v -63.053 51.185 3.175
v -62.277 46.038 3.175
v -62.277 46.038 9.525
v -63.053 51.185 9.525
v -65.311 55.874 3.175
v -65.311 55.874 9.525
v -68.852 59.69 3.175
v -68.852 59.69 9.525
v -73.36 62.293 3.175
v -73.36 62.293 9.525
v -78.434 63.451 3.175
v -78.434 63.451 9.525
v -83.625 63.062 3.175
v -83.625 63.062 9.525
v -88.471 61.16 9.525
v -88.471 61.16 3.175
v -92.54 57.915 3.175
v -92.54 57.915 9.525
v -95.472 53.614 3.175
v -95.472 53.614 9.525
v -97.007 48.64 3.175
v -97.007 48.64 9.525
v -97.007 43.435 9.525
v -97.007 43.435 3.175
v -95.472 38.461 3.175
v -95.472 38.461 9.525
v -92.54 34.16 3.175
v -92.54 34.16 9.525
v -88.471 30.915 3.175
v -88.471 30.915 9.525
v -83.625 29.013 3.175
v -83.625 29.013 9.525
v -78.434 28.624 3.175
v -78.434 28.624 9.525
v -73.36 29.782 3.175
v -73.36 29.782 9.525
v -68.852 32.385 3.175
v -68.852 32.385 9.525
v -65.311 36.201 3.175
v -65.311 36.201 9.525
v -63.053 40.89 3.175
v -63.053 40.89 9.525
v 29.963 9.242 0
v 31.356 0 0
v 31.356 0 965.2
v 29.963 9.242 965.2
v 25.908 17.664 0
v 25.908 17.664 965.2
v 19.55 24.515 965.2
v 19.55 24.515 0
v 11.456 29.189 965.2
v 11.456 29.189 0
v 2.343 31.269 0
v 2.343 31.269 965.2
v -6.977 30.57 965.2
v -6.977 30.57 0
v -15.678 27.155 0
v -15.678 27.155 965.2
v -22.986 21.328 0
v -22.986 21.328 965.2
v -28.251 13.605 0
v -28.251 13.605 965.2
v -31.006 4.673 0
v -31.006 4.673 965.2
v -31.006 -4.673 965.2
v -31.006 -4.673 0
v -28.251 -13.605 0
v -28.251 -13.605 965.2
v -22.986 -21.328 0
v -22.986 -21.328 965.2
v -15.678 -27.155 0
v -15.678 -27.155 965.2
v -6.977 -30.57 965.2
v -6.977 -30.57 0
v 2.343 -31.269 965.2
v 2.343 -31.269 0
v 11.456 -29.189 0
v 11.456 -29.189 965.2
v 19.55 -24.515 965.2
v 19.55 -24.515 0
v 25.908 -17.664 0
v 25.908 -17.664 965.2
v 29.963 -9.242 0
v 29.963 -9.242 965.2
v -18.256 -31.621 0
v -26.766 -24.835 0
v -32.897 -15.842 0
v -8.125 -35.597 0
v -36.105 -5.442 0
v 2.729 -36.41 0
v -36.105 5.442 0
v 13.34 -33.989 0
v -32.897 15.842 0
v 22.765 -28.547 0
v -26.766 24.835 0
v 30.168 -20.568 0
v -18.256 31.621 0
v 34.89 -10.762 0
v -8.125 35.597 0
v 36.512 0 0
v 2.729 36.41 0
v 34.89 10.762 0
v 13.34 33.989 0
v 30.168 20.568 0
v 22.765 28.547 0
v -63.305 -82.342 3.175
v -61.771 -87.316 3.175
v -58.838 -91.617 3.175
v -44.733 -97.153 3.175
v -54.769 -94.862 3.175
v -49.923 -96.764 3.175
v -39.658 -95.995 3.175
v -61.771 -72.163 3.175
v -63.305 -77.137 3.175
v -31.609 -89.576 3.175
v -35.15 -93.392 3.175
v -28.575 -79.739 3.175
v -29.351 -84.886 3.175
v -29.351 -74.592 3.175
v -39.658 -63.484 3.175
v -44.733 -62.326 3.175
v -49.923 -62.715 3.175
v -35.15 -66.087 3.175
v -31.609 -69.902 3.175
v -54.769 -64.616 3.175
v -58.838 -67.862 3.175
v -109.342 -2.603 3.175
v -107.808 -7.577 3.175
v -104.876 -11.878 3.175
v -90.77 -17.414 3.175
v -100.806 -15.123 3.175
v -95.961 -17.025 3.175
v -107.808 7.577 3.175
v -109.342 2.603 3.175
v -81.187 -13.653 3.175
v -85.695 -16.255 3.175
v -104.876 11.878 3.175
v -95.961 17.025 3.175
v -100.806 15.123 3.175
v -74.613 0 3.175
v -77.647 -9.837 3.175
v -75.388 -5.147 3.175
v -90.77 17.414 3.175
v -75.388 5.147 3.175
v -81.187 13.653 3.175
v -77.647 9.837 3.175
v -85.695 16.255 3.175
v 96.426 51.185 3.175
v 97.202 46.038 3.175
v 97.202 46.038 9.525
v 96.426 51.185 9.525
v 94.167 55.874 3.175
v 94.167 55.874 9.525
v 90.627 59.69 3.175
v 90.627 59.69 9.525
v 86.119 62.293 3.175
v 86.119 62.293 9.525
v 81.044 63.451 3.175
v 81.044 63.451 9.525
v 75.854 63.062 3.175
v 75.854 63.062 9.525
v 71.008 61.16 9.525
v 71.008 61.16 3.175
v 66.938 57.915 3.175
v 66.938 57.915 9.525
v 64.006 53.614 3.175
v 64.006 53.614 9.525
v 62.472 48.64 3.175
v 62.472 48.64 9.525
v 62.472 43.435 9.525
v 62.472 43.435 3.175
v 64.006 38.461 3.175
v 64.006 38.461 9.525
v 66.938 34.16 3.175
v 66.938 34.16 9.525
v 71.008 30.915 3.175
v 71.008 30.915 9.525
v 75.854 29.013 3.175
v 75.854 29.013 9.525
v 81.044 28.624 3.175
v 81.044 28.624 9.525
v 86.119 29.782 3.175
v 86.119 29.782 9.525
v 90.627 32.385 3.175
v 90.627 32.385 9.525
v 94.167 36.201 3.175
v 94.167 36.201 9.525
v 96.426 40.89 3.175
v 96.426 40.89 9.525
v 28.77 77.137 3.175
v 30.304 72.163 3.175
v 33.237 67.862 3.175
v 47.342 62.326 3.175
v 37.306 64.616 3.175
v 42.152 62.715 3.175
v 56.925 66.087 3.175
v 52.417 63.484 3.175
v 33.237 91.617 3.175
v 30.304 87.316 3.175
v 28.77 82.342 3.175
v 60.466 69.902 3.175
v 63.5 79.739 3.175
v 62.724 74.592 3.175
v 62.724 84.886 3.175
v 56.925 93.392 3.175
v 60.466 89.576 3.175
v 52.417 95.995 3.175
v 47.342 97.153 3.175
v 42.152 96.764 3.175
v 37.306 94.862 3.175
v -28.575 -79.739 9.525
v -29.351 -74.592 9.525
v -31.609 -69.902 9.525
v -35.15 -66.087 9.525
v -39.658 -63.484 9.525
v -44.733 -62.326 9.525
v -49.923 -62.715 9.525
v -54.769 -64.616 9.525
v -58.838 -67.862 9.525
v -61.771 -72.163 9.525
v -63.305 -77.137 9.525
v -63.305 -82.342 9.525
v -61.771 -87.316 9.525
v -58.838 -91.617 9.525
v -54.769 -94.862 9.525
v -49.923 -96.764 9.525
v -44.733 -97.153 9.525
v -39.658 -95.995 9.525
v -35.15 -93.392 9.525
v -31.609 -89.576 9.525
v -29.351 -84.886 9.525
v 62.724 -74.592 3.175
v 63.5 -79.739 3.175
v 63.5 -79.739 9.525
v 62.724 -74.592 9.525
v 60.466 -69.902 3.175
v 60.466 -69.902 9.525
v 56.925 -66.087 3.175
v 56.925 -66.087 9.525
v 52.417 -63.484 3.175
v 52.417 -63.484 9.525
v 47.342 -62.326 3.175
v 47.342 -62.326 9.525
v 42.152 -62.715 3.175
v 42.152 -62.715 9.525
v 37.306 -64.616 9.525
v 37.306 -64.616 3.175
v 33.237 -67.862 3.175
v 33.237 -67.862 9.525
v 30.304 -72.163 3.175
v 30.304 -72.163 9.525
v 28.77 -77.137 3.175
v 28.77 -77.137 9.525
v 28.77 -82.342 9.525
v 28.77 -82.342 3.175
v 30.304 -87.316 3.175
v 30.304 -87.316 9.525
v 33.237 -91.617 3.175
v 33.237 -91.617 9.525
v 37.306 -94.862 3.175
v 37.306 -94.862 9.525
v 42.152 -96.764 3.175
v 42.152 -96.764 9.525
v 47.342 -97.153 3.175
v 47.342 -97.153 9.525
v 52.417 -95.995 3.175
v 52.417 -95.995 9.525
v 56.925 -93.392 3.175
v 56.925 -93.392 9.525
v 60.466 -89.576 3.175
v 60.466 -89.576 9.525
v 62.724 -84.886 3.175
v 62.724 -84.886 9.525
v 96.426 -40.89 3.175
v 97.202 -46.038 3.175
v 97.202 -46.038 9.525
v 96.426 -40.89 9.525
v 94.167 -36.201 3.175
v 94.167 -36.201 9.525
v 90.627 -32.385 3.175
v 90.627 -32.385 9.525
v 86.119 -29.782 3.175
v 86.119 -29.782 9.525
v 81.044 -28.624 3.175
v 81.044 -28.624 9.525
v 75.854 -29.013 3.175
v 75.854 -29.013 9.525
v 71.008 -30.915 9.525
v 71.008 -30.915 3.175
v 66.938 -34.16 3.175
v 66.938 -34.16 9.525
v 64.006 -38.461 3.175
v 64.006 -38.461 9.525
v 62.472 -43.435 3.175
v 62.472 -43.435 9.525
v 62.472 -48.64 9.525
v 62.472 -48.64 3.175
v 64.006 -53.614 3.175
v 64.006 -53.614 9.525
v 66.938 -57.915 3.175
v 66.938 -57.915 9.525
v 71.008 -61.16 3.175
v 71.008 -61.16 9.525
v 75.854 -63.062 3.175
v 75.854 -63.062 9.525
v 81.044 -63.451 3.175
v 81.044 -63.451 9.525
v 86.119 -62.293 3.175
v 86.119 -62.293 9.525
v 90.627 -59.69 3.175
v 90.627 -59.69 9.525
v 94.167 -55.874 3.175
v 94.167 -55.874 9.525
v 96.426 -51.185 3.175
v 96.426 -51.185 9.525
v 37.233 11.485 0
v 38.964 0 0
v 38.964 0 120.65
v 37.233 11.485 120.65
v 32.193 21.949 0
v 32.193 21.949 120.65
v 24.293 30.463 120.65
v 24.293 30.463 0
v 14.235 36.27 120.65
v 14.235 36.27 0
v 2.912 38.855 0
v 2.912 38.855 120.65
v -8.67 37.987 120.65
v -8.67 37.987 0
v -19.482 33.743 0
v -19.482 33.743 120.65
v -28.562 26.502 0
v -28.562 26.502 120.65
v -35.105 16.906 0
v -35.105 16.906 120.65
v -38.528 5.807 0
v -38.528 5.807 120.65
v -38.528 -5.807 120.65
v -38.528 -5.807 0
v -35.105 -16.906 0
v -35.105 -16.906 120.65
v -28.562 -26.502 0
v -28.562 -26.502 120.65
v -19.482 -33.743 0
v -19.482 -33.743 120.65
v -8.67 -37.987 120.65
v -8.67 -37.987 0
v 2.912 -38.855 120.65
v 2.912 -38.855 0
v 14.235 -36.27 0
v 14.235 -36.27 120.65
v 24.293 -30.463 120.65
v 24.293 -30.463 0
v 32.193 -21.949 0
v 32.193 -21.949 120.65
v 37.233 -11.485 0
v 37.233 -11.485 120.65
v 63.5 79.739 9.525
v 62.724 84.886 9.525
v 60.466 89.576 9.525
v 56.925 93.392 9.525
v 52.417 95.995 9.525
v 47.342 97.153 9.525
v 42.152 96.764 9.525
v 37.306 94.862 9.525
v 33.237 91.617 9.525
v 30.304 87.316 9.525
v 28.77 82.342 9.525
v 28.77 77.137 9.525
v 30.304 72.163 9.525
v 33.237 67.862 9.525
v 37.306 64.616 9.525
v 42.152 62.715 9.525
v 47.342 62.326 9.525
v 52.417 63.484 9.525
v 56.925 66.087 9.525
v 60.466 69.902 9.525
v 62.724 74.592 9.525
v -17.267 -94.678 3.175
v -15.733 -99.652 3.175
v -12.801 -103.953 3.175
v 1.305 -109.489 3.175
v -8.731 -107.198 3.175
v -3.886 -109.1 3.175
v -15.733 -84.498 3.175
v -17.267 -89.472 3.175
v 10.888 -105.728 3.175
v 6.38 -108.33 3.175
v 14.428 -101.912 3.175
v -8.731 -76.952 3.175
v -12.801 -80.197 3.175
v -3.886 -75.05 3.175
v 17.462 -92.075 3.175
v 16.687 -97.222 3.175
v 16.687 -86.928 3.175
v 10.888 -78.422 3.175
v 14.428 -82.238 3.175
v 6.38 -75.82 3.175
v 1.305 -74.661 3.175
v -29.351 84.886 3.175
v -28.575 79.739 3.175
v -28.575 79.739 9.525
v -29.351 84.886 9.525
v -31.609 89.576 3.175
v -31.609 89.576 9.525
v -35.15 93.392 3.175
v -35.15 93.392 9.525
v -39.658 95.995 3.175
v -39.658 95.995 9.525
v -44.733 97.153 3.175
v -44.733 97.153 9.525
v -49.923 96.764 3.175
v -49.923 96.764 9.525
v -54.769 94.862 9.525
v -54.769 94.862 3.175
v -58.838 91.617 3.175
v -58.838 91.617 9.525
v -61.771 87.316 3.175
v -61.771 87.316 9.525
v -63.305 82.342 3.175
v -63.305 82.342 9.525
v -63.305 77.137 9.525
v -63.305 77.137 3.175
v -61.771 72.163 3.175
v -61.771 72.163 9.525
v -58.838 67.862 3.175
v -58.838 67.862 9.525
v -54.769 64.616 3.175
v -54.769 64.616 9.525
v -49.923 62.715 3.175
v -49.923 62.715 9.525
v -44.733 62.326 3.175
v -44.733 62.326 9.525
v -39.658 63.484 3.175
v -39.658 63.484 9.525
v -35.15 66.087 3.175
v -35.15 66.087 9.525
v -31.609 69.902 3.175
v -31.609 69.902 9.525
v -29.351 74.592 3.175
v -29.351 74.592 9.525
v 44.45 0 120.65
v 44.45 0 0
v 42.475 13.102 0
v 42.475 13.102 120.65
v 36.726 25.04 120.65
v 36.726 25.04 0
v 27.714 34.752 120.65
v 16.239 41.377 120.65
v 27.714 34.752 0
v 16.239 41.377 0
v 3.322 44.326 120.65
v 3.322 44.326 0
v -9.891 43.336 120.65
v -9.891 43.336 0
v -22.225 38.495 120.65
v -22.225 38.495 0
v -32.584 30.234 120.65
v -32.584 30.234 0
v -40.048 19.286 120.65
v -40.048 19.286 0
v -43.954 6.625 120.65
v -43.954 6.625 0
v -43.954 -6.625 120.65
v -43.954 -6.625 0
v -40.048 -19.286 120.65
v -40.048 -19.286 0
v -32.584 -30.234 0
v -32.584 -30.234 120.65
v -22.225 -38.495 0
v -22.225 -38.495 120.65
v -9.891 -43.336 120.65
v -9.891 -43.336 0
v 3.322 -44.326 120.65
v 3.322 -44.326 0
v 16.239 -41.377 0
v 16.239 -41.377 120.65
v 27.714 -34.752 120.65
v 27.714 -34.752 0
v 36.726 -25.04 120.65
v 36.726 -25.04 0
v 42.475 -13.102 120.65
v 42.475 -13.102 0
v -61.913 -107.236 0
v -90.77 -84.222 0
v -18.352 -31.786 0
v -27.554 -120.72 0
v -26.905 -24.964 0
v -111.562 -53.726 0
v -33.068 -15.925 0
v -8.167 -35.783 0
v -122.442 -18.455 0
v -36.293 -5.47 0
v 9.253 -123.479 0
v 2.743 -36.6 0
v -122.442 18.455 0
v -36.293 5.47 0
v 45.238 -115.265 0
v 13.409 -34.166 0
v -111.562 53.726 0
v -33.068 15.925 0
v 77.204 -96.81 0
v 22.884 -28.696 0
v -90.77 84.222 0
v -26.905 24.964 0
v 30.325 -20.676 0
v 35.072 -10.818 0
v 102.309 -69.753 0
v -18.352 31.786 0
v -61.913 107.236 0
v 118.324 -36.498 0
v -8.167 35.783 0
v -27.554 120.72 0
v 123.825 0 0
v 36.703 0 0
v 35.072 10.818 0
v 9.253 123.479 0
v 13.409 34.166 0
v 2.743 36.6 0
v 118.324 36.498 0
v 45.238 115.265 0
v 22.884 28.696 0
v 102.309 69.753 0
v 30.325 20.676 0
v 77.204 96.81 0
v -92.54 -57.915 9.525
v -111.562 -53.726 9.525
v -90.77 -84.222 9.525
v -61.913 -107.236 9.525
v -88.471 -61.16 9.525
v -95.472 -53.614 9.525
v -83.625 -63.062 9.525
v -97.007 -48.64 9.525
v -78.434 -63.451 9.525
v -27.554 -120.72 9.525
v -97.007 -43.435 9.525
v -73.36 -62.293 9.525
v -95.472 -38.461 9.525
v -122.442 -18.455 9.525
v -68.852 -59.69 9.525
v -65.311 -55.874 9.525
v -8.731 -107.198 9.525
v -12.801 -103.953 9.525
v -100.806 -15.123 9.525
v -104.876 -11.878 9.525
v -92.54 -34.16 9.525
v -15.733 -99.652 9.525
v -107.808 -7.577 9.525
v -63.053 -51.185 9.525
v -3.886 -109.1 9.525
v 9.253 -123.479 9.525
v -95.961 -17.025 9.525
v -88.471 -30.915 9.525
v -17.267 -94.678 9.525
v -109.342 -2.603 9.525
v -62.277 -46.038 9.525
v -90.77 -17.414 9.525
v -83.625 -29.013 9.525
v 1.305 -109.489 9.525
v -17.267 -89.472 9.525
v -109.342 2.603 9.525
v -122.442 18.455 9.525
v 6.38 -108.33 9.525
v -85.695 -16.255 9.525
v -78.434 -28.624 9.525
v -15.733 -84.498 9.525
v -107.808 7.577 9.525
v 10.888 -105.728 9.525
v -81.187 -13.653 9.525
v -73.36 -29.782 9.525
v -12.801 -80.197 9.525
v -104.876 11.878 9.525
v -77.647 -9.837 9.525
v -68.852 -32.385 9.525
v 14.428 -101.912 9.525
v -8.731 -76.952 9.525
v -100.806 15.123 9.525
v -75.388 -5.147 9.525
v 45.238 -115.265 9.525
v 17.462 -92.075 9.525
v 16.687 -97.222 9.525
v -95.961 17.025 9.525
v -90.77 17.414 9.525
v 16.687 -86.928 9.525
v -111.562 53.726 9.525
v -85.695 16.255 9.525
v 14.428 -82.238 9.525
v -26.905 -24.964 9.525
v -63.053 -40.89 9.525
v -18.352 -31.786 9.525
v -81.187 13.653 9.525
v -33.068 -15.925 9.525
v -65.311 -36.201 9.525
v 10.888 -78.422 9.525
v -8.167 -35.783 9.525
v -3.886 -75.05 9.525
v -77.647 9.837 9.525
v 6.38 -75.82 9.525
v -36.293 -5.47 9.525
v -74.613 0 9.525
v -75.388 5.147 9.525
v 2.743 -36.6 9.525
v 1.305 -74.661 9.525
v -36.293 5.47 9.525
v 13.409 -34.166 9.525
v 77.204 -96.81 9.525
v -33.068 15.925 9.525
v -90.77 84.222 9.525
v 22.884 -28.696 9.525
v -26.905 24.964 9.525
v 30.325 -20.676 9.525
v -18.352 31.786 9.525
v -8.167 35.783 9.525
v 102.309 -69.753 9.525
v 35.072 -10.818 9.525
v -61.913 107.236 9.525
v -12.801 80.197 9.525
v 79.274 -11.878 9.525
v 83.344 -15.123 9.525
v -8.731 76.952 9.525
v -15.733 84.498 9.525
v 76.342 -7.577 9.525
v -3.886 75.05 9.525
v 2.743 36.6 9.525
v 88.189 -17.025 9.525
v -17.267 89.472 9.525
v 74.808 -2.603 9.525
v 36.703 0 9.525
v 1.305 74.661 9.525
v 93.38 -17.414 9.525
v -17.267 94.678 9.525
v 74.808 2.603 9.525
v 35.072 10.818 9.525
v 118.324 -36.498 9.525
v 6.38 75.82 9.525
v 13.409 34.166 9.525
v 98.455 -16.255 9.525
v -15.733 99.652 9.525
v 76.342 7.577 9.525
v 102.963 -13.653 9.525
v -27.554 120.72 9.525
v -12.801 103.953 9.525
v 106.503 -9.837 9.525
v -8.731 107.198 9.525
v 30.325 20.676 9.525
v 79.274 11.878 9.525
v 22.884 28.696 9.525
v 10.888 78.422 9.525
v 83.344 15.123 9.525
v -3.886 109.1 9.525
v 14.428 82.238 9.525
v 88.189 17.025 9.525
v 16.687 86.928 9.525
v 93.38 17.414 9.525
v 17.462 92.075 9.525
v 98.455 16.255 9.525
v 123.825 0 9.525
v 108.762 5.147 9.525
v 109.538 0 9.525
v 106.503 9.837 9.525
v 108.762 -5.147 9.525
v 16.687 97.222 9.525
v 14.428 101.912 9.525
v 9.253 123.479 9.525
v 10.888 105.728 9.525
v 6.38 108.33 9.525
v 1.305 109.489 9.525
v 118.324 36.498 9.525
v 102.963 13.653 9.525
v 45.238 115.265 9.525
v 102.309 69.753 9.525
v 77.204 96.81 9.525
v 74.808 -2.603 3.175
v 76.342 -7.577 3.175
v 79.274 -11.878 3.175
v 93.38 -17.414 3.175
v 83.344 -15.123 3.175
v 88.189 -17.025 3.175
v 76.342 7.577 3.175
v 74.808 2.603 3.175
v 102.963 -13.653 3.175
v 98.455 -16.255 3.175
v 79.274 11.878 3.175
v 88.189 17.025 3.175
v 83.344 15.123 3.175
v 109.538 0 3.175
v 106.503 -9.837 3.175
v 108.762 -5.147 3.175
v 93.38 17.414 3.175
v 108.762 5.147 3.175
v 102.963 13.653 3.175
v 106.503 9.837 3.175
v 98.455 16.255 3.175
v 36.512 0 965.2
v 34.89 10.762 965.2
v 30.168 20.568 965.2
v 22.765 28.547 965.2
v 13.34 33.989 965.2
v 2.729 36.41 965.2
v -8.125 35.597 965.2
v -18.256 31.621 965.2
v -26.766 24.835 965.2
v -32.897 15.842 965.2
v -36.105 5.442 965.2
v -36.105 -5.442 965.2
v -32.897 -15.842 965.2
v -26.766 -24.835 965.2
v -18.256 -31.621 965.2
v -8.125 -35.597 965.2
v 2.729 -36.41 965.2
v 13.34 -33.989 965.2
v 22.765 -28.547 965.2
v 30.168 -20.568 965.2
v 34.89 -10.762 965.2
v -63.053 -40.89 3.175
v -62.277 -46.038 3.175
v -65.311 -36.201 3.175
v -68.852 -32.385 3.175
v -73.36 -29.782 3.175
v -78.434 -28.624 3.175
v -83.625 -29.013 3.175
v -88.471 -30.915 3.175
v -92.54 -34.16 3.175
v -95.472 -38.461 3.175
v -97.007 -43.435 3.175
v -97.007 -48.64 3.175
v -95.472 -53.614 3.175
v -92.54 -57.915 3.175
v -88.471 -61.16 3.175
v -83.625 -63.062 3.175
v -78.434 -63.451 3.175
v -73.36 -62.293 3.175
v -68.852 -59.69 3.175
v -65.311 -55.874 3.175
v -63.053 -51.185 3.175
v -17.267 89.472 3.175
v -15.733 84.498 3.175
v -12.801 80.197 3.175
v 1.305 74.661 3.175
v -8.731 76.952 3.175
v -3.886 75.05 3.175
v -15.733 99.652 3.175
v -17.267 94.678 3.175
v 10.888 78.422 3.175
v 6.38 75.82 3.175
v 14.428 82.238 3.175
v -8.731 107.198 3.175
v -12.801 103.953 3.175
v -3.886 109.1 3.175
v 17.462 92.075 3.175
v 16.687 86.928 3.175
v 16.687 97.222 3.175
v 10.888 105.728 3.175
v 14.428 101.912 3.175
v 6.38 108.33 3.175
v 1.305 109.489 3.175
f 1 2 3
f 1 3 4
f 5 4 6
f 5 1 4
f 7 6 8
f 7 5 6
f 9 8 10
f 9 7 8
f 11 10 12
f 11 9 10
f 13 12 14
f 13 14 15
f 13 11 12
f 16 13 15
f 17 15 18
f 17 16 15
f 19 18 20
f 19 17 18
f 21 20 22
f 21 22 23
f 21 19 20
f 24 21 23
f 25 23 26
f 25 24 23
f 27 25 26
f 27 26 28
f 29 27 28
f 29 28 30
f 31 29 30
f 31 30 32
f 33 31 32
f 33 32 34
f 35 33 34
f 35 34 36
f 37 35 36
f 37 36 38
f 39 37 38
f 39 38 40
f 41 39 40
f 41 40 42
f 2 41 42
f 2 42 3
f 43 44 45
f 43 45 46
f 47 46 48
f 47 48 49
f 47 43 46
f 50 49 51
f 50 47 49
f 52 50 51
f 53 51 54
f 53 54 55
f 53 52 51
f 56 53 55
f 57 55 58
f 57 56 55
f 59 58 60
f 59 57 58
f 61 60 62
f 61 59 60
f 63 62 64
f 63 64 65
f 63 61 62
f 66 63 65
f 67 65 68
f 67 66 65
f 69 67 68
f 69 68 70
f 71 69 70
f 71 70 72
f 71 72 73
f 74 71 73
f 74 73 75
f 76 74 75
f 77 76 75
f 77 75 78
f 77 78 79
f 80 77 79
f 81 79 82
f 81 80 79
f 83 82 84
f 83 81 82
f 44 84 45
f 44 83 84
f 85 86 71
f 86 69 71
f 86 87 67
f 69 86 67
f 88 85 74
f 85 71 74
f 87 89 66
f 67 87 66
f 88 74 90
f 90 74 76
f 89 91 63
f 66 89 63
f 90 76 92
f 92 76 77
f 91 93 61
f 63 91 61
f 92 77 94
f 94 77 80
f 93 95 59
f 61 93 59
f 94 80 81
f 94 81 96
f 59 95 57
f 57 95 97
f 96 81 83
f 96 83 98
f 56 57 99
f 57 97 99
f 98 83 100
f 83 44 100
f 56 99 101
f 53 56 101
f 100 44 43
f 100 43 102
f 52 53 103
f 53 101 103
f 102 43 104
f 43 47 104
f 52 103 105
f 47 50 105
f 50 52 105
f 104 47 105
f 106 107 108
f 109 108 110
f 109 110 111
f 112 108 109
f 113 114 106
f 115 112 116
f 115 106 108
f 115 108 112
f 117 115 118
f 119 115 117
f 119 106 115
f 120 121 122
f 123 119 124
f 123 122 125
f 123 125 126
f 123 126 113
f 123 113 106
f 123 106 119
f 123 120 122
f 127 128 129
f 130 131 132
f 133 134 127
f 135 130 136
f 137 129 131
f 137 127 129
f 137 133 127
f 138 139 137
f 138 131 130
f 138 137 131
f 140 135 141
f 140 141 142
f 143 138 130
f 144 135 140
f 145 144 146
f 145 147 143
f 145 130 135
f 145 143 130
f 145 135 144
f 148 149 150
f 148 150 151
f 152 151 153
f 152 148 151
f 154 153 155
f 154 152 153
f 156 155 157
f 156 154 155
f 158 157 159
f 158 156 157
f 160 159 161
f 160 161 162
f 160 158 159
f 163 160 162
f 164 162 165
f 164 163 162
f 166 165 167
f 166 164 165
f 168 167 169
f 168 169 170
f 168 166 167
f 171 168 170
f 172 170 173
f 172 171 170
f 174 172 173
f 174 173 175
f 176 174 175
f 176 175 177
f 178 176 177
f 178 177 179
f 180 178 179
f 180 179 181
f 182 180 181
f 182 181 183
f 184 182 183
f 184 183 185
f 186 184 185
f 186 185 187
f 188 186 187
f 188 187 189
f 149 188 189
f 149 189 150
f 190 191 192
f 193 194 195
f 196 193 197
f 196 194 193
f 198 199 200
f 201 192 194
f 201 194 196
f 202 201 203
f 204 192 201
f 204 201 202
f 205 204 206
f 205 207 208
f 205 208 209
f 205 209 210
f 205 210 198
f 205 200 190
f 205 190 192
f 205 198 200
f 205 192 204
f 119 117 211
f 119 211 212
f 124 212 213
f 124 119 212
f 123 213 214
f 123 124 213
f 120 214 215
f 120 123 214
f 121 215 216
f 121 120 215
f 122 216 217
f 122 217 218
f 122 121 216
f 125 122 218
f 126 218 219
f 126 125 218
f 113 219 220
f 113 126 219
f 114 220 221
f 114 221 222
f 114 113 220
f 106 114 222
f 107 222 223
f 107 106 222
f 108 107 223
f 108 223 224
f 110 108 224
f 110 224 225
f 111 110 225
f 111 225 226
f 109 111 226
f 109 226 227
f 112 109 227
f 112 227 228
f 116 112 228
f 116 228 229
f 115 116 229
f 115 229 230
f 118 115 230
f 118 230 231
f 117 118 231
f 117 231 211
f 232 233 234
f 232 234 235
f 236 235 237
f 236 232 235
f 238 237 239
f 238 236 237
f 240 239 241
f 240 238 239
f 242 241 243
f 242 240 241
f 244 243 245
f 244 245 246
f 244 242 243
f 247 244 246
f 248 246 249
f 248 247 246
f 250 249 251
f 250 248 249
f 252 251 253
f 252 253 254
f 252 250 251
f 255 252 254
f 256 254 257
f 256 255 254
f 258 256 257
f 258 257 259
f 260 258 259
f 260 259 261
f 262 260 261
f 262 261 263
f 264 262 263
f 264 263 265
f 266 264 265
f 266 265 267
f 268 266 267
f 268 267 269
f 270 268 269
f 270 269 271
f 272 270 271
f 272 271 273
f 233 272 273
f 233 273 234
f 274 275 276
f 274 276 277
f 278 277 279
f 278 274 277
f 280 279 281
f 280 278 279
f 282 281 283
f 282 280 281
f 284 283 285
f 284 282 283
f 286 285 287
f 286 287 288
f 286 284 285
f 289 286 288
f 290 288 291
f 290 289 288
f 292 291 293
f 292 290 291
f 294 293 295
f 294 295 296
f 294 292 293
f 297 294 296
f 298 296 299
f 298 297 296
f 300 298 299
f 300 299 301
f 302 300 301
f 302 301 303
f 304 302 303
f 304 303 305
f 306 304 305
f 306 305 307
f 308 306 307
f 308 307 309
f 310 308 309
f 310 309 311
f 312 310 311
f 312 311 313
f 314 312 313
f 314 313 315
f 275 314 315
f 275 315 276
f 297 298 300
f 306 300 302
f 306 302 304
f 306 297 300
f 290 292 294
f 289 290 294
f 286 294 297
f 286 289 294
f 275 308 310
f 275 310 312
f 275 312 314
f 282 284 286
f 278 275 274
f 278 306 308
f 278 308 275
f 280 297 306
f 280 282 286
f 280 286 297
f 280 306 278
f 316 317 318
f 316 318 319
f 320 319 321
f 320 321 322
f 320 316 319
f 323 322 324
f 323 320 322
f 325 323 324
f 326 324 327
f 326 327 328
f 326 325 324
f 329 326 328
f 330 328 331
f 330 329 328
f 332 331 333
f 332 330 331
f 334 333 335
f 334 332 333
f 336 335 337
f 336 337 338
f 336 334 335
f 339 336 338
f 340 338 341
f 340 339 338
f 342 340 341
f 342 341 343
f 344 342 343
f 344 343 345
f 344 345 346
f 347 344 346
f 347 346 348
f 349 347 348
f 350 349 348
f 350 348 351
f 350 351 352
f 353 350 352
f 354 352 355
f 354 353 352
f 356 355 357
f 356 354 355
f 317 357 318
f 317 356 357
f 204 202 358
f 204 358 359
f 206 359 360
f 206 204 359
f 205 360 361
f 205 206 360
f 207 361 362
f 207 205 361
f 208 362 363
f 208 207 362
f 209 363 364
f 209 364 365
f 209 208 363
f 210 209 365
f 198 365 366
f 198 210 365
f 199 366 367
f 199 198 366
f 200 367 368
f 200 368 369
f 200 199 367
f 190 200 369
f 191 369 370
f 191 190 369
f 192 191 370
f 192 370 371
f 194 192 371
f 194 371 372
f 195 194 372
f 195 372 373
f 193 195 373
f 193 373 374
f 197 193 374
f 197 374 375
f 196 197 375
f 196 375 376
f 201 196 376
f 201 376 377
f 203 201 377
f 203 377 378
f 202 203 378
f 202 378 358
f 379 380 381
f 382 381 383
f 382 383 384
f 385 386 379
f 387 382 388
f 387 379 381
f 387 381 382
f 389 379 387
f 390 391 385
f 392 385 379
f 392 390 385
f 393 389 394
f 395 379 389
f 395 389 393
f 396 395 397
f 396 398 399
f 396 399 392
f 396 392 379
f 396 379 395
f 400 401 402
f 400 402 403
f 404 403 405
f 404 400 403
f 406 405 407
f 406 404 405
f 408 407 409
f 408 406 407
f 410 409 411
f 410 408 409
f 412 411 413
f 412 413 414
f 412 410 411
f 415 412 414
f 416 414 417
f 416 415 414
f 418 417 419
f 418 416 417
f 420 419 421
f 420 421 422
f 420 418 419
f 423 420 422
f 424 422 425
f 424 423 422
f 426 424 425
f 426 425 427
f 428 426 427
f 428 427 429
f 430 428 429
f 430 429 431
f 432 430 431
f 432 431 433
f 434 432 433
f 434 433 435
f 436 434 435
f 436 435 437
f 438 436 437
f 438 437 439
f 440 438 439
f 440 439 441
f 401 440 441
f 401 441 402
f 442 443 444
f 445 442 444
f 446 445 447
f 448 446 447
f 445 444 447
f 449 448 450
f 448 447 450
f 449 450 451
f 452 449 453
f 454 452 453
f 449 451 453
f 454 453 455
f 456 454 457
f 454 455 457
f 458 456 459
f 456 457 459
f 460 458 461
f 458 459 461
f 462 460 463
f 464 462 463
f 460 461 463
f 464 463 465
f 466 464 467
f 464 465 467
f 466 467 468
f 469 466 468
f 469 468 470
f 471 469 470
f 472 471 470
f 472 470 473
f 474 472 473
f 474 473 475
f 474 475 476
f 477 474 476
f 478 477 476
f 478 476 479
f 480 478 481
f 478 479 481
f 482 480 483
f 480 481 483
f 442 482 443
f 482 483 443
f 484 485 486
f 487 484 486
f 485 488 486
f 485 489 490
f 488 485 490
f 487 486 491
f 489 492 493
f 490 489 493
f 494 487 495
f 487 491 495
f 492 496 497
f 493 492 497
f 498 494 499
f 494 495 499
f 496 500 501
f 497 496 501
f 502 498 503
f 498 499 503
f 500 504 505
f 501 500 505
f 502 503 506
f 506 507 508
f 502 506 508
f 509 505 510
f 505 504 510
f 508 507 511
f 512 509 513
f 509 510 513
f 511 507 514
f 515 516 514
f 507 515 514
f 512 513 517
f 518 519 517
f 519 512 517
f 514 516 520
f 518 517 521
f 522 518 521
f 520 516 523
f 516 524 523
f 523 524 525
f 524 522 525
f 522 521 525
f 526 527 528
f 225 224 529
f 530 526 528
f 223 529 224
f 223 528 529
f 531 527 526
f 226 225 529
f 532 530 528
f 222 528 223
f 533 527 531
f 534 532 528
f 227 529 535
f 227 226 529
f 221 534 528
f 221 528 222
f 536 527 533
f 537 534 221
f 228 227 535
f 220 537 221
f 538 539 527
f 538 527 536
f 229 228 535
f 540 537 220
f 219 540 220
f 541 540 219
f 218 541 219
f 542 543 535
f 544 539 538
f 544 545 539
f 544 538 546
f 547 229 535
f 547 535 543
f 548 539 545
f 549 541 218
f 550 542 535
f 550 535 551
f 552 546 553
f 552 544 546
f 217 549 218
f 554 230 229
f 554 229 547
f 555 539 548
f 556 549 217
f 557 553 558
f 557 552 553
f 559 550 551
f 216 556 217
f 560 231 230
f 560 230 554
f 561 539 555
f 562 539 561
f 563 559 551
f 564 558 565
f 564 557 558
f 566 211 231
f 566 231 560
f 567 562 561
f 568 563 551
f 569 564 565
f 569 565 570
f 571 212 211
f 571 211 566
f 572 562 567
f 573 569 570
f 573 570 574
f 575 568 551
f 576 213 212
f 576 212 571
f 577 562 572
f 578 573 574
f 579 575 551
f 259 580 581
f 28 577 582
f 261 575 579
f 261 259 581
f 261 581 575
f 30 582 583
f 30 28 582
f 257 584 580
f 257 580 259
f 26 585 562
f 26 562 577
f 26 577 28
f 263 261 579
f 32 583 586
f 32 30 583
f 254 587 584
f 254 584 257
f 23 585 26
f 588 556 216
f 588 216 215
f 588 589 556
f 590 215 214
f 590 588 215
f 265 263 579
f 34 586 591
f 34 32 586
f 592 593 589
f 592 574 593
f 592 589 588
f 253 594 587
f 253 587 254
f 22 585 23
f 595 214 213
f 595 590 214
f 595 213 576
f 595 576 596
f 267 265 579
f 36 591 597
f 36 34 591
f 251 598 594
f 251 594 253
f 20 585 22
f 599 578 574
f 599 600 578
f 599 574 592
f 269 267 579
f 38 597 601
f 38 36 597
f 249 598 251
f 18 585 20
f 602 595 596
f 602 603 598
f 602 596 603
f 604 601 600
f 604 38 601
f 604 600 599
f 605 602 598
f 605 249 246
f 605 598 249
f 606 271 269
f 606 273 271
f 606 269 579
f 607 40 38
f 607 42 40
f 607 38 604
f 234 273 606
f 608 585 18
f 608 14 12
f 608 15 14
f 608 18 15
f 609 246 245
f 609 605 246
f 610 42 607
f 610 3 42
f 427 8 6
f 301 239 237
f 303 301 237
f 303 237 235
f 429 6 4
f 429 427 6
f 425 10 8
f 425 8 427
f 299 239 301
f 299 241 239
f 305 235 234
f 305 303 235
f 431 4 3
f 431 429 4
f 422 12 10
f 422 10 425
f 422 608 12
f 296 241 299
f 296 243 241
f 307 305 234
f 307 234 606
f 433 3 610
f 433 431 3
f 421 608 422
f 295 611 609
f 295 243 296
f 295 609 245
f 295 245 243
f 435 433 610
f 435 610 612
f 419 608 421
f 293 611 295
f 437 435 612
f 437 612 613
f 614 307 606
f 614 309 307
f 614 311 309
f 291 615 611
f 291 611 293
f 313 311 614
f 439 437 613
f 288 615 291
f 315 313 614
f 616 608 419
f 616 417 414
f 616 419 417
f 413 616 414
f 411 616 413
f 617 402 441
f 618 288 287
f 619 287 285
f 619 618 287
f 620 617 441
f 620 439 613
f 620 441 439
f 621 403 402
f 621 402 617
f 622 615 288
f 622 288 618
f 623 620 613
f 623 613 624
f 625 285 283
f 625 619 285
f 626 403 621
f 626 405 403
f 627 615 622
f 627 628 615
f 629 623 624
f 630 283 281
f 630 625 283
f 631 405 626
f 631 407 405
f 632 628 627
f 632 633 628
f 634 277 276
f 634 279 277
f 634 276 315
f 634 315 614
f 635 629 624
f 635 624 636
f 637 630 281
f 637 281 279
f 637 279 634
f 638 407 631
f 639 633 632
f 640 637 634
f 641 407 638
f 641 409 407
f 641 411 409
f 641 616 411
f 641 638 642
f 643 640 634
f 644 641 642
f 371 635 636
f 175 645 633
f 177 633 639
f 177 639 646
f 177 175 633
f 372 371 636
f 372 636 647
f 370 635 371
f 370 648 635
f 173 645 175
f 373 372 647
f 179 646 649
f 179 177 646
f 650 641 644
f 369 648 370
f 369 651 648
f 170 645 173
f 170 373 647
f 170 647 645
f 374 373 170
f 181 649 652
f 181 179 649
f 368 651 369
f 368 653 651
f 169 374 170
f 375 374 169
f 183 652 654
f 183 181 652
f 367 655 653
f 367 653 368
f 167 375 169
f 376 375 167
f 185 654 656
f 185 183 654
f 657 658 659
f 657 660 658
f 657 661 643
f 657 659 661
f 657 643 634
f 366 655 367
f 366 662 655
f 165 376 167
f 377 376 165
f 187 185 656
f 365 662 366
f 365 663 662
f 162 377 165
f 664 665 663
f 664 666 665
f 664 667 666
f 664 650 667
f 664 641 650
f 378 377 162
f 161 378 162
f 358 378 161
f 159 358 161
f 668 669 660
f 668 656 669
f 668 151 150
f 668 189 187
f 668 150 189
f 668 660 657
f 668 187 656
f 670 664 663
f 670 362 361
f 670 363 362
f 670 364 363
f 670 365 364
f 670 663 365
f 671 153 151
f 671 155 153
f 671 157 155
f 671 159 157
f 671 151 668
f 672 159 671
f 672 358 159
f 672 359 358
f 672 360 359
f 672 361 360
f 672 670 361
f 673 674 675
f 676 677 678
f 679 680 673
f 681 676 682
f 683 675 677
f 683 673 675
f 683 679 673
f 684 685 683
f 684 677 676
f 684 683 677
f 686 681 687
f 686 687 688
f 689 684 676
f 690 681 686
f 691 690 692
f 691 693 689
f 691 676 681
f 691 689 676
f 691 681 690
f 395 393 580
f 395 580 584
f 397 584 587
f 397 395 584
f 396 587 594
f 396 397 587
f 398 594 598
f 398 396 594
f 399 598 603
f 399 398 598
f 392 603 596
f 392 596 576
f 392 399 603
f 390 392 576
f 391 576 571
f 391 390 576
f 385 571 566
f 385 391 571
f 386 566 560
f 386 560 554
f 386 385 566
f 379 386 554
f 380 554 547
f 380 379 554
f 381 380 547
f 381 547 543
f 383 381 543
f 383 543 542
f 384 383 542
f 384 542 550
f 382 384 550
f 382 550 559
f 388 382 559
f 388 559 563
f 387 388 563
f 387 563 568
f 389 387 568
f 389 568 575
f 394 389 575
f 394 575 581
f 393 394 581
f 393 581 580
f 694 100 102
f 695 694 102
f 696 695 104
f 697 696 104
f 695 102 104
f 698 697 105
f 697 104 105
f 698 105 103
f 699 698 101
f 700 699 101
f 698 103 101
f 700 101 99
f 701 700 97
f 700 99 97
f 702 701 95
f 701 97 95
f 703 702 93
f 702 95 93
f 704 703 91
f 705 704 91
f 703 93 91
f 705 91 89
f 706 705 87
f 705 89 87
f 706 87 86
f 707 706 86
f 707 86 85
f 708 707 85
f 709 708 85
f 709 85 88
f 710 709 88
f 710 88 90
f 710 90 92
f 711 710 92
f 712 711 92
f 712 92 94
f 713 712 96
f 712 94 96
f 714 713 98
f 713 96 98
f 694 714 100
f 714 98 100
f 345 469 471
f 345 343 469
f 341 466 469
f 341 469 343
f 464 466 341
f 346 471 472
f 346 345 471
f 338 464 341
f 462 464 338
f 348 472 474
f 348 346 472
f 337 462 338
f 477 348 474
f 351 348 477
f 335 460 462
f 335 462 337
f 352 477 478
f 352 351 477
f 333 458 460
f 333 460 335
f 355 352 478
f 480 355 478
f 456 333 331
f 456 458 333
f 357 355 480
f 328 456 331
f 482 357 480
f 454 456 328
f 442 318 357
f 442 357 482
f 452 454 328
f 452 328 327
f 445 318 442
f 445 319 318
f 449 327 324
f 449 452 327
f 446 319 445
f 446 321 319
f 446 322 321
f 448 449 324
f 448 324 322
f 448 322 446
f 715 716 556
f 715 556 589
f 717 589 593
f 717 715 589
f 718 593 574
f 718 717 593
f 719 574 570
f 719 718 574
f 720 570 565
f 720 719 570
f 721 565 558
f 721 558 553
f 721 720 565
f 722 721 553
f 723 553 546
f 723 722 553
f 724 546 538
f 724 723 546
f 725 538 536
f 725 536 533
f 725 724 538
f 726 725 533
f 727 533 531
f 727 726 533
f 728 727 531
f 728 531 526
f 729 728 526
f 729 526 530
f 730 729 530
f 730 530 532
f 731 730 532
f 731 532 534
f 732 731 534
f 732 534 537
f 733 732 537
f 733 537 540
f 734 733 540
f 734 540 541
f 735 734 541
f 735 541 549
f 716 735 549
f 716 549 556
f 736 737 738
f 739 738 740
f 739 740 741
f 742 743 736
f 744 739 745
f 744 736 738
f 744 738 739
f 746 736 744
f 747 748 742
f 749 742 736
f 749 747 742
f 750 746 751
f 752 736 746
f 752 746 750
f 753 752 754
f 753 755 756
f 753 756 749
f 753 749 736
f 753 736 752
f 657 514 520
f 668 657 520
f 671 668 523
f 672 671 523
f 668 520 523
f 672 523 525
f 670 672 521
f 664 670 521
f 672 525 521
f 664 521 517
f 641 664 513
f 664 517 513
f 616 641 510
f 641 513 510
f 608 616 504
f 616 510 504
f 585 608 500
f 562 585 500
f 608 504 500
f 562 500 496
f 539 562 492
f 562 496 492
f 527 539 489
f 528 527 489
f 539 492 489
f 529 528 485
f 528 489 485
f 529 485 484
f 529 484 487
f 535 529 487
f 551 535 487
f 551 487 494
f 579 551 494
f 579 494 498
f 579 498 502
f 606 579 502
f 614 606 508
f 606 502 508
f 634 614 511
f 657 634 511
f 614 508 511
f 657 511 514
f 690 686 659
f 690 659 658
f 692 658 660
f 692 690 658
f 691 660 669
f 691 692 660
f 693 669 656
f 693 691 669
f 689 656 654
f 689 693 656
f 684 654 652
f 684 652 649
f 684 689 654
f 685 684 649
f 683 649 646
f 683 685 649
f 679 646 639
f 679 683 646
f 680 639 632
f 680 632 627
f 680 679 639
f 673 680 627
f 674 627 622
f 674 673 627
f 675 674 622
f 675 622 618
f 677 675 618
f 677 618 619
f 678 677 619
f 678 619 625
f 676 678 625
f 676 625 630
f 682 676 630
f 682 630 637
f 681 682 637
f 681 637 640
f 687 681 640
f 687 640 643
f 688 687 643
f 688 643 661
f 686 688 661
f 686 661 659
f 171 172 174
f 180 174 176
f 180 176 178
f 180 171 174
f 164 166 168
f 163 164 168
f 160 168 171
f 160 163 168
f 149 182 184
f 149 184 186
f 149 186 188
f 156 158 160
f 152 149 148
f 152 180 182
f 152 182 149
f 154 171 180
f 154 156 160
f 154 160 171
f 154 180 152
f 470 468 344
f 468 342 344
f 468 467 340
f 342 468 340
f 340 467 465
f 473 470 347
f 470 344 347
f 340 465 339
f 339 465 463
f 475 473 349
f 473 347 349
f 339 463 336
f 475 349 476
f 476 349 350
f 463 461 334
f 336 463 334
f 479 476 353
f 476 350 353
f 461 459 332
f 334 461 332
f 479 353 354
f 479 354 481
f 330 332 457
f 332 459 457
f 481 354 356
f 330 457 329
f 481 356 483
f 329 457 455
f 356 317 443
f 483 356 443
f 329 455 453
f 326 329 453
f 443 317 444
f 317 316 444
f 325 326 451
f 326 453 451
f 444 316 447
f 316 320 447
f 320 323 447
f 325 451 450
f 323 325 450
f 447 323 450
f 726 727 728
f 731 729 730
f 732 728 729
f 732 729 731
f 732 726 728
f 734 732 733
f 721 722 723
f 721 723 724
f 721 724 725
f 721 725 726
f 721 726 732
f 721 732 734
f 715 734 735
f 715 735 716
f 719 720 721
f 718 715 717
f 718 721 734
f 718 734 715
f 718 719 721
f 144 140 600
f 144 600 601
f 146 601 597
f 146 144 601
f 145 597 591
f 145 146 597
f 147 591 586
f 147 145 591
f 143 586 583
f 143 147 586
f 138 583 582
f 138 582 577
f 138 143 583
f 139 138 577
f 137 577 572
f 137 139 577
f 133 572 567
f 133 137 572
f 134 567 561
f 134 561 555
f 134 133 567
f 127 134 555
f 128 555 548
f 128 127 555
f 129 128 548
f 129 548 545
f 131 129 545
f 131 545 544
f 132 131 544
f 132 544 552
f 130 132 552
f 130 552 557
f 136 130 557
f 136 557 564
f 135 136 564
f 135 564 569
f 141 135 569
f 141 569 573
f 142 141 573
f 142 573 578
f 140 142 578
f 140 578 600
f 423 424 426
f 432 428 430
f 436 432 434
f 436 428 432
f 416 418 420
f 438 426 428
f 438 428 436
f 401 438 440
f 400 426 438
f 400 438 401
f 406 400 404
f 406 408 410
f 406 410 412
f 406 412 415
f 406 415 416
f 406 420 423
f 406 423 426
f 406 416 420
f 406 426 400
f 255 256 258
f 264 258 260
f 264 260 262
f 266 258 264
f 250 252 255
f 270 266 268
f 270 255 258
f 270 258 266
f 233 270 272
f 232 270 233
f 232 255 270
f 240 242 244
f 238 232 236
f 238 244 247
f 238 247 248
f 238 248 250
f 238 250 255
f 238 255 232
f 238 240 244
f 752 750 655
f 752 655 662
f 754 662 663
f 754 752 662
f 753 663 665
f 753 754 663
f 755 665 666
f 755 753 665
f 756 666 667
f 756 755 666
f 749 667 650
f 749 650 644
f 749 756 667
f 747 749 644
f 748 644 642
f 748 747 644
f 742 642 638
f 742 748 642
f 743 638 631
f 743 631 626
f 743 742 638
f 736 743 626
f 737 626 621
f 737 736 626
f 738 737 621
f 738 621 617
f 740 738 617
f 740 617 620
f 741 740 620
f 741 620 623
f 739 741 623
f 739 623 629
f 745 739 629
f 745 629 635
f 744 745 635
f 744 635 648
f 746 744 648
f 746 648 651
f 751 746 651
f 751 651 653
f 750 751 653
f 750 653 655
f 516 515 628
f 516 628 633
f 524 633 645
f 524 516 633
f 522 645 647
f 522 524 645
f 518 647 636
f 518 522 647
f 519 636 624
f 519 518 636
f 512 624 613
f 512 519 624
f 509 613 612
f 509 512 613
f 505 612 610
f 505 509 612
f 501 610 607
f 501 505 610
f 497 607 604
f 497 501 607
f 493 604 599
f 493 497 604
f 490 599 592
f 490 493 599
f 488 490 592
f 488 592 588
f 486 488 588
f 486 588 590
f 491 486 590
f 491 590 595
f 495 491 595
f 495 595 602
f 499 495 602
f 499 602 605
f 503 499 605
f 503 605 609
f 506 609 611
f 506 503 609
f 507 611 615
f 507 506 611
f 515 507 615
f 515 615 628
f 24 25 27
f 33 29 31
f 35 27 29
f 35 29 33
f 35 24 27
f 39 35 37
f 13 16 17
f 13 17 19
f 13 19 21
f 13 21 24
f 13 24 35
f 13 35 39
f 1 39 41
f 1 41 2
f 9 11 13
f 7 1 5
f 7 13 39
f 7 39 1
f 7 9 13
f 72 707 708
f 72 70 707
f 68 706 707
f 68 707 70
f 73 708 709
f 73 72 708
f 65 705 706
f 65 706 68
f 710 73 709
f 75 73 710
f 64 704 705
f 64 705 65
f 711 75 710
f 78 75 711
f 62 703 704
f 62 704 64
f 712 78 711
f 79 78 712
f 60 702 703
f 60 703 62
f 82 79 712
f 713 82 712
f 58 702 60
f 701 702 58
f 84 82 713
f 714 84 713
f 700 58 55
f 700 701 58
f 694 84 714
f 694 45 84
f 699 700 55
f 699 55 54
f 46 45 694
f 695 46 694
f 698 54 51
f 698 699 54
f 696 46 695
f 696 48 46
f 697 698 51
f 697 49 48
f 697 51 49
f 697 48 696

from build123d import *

# Parameters (mm, degrees)
F0_R     = 123.825
F0_R_2   = 17.4625
F0_R_3   = 44.45
F0_R_4   = 38.9636
F0_R_5   = 36.703
F1_DEPTH = 9.525
F2_DEPTH = 3.175
F0_R_6   = 36.5125
F0_R_7   = 31.3563
F3_DEPTH = 965.2
F4_DEPTH = 120.65


with BuildPart() as f1:
    # F0 (on Top) → F1 (new body)
    with BuildSketch(Plane.XY):
        Circle(F0_R)
        with Locations((-46.0375, -79.7392890535)):
            Circle(F0_R_2, mode=Mode.SUBTRACT)
        with Locations((-79.7392890535, -46.0375)):
            Circle(F0_R_2, mode=Mode.SUBTRACT)
        with Locations((0, -92.075)):
            Circle(F0_R_2, mode=Mode.SUBTRACT)
        with Locations((46.0375, -79.7392890535)):
            Circle(F0_R_2, mode=Mode.SUBTRACT)
        with Locations((79.7392890535, -46.0375)):
            Circle(F0_R_2, mode=Mode.SUBTRACT)
        with Locations((-92.075, 0)):
            Circle(F0_R_2, mode=Mode.SUBTRACT)
        with Locations((-79.7392890535, 46.0375)):
            Circle(F0_R_2, mode=Mode.SUBTRACT)
        with Locations((-46.0375, 79.7392890535)):
            Circle(F0_R_2, mode=Mode.SUBTRACT)
        Circle(F0_R_3, mode=Mode.SUBTRACT)
        with Locations((92.075, 0)):
            Circle(F0_R_2, mode=Mode.SUBTRACT)
        with Locations((79.7392890535, 46.0375)):
            Circle(F0_R_2, mode=Mode.SUBTRACT)
        with Locations((0, 92.075)):
            Circle(F0_R_2, mode=Mode.SUBTRACT)
        with Locations((46.0375, 79.7392890535)):
            Circle(F0_R_2, mode=Mode.SUBTRACT)
        Circle(F0_R_3)
        Circle(F0_R_4, mode=Mode.SUBTRACT)
        Circle(F0_R_4)
        Circle(F0_R_5, mode=Mode.SUBTRACT)
    extrude(amount=F1_DEPTH)

    # F0 (on Top) → F2 (join)
    with BuildSketch(Plane.XY):
        with Locations((-46.0375, 79.7392890535)):
            Circle(F0_R_2)
        with Locations((0, 92.075)):
            Circle(F0_R_2)
        with Locations((46.0375, 79.7392890535)):
            Circle(F0_R_2)
        with Locations((92.075, 0)):
            Circle(F0_R_2)
        with Locations((79.7392890535, 46.0375)):
            Circle(F0_R_2)
        with Locations((79.7392890535, -46.0375)):
            Circle(F0_R_2)
        with Locations((46.0375, -79.7392890535)):
            Circle(F0_R_2)
        with Locations((0, -92.075)):
            Circle(F0_R_2)
        with Locations((-46.0375, -79.7392890535)):
            Circle(F0_R_2)
        with Locations((-79.7392890535, -46.0375)):
            Circle(F0_R_2)
        with Locations((-92.075, 0)):
            Circle(F0_R_2)
        with Locations((-79.7392890535, 46.0375)):
            Circle(F0_R_2)
    extrude(amount=F2_DEPTH)


with BuildPart() as f3:
    # F0 (on Top) → F3 (new body)
    with BuildSketch(Plane.XY):
        Circle(F0_R_6)
        Circle(F0_R_7, mode=Mode.SUBTRACT)
    extrude(amount=F3_DEPTH)


with BuildPart() as f4:
    # F0 (on Top) → F4 (new body)
    with BuildSketch(Plane.XY):
        Circle(F0_R_3)
        Circle(F0_R_4, mode=Mode.SUBTRACT)
    extrude(amount=F4_DEPTH)


solid = Compound([f1.part, f3.part, f4.part])
